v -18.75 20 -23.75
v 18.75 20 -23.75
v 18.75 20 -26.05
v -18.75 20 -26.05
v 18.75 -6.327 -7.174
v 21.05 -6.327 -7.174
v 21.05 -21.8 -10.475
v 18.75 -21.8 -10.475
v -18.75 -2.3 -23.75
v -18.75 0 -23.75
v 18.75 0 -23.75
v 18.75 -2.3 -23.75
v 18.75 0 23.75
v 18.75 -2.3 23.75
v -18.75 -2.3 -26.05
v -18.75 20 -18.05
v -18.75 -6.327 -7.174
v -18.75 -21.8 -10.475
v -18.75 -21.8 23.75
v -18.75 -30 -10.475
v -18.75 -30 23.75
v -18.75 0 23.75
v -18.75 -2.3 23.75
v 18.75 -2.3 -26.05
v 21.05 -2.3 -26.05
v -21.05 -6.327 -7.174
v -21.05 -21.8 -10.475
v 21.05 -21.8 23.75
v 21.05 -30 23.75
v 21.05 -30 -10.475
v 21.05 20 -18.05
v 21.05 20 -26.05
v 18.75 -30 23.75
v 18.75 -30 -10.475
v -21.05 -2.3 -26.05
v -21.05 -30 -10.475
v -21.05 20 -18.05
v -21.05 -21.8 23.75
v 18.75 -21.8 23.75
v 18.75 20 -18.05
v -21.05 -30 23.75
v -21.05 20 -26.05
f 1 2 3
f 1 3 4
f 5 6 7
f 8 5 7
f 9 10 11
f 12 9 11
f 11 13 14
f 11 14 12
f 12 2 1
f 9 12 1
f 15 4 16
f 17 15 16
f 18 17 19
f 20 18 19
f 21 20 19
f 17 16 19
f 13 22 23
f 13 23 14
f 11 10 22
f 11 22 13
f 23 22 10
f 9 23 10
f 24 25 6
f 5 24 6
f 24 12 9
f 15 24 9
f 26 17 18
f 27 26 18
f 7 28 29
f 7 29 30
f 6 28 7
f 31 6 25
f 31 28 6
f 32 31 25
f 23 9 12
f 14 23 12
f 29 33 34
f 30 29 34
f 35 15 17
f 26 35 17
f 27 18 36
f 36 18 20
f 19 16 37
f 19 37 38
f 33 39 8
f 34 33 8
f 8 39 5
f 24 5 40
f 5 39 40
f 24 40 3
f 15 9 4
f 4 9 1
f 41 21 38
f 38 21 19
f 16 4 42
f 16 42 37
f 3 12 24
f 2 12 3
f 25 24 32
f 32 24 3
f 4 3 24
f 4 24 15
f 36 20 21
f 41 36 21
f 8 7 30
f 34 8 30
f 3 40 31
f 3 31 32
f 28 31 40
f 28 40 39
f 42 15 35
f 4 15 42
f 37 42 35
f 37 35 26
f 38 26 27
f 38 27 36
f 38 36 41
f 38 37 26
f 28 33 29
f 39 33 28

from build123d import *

# Parameters (mm, degrees)
SKETCH1_W               = 37.5
SKETCH1_H               = 47.5
BASE_FLANGE1_DEPTH      = 2.3
SKETCH9_W               = 49.8
SKETCH9_H               = 50
BASE_FLANGE2_DEPTH      = 2.3
SKETCH12_W              = 37.5
SKETCH12_H              = 22.3
BASE_FLANGE3_DEPTH      = 2.3
SKETCH15_W              = 49.8
SKETCH15_H              = 50
BASE_FLANGE4_DEPTH      = 2.3
CUT_EXTRUDE1_DEPTH      = 58.887930521
CUT_EXTRUDE1_DEPTH_BACK = 58.887930521
CUT_EXTRUDE2_DEPTH      = 58.887930521
CUT_EXTRUDE2_DEPTH_BACK = 58.887930521


# Sheet-metal steps are written as plain solids
with BuildPart() as part:
    # Sketch1 → Base-Flange1 (new body)
    with BuildSketch(Plane(origin=(0, 0, 0), x_dir=(1, 0, 0), z_dir=(0, 1, 0))):
        Rectangle(SKETCH1_W, SKETCH1_H)
    extrude(amount=-BASE_FLANGE1_DEPTH)


with BuildPart() as body_2:
    # Sketch9 → Base-Flange2 (new body)
    with BuildSketch(Plane.ZY.offset(18.75)):
        with Locations((-1.15, -5)):
            Rectangle(SKETCH9_W, SKETCH9_H)
    extrude(amount=BASE_FLANGE2_DEPTH)


with BuildPart() as body_3:
    # Sketch12 → Base-Flange3 (new body)
    with BuildSketch(Plane(origin=(0, 0, -23.75), x_dir=(-1, 0, 0), z_dir=(0, 0, -1))):
        with Locations((0, 8.85)):
            Rectangle(SKETCH12_W, SKETCH12_H)
    extrude(amount=BASE_FLANGE3_DEPTH)


with BuildPart() as body_4:
    # Sketch15 → Base-Flange4 (new body)
    with BuildSketch(Plane(origin=(18.75, 0, 0), x_dir=(0, 0, -1), z_dir=(1, 0, 0))):
        with Locations((1.15, -5)):
            Rectangle(SKETCH15_W, SKETCH15_H)
    extrude(amount=BASE_FLANGE4_DEPTH)


with BuildPart() as cut_extrude1_tool:
    # Sketch18 → Cut-Extrude1 (new, two sides: drawn at the far end of the back side and taken through both)
    with BuildSketch(Plane.ZY.offset(21.05).offset(-CUT_EXTRUDE1_DEPTH_BACK)):
        Polygon((-18.05, 20), (23.75, -21.8), (23.75, 20), align=None)
    extrude(amount=CUT_EXTRUDE1_DEPTH + CUT_EXTRUDE1_DEPTH_BACK)


with BuildPart() as body_2_1:
    add(body_2.part)

    # Cut-Extrude1: cut by cut_extrude1_tool
    add(cut_extrude1_tool.part, mode=Mode.SUBTRACT)


with BuildPart() as body_4_1:
    add(body_4.part)

    # Cut-Extrude1: cut by cut_extrude1_tool
    add(cut_extrude1_tool.part, mode=Mode.SUBTRACT)


with BuildPart() as cut_extrude2_tool:
    # Sketch19 → Cut-Extrude2 (new, two sides: drawn at the far end of the back side and taken through both)
    with BuildSketch(Plane.ZY.offset(21.05).offset(-CUT_EXTRUDE2_DEPTH_BACK)):
        Polygon((-26.05, -2.3), (-7.174048239, -6.32706006), (-10.475098127, -21.8), (-10.475098127, -30), (-26.05, -30), align=None)
    extrude(amount=CUT_EXTRUDE2_DEPTH + CUT_EXTRUDE2_DEPTH_BACK)


with BuildPart() as body_2_2:
    add(body_2_1.part)

    # Cut-Extrude2: cut by cut_extrude2_tool
    add(cut_extrude2_tool.part, mode=Mode.SUBTRACT)


with BuildPart() as body_4_2:
    add(body_4_1.part)

    # Cut-Extrude2: cut by cut_extrude2_tool
    add(cut_extrude2_tool.part, mode=Mode.SUBTRACT)


solid = Compound([part.part, body_3.part, body_2_2.part, body_4_2.part])
